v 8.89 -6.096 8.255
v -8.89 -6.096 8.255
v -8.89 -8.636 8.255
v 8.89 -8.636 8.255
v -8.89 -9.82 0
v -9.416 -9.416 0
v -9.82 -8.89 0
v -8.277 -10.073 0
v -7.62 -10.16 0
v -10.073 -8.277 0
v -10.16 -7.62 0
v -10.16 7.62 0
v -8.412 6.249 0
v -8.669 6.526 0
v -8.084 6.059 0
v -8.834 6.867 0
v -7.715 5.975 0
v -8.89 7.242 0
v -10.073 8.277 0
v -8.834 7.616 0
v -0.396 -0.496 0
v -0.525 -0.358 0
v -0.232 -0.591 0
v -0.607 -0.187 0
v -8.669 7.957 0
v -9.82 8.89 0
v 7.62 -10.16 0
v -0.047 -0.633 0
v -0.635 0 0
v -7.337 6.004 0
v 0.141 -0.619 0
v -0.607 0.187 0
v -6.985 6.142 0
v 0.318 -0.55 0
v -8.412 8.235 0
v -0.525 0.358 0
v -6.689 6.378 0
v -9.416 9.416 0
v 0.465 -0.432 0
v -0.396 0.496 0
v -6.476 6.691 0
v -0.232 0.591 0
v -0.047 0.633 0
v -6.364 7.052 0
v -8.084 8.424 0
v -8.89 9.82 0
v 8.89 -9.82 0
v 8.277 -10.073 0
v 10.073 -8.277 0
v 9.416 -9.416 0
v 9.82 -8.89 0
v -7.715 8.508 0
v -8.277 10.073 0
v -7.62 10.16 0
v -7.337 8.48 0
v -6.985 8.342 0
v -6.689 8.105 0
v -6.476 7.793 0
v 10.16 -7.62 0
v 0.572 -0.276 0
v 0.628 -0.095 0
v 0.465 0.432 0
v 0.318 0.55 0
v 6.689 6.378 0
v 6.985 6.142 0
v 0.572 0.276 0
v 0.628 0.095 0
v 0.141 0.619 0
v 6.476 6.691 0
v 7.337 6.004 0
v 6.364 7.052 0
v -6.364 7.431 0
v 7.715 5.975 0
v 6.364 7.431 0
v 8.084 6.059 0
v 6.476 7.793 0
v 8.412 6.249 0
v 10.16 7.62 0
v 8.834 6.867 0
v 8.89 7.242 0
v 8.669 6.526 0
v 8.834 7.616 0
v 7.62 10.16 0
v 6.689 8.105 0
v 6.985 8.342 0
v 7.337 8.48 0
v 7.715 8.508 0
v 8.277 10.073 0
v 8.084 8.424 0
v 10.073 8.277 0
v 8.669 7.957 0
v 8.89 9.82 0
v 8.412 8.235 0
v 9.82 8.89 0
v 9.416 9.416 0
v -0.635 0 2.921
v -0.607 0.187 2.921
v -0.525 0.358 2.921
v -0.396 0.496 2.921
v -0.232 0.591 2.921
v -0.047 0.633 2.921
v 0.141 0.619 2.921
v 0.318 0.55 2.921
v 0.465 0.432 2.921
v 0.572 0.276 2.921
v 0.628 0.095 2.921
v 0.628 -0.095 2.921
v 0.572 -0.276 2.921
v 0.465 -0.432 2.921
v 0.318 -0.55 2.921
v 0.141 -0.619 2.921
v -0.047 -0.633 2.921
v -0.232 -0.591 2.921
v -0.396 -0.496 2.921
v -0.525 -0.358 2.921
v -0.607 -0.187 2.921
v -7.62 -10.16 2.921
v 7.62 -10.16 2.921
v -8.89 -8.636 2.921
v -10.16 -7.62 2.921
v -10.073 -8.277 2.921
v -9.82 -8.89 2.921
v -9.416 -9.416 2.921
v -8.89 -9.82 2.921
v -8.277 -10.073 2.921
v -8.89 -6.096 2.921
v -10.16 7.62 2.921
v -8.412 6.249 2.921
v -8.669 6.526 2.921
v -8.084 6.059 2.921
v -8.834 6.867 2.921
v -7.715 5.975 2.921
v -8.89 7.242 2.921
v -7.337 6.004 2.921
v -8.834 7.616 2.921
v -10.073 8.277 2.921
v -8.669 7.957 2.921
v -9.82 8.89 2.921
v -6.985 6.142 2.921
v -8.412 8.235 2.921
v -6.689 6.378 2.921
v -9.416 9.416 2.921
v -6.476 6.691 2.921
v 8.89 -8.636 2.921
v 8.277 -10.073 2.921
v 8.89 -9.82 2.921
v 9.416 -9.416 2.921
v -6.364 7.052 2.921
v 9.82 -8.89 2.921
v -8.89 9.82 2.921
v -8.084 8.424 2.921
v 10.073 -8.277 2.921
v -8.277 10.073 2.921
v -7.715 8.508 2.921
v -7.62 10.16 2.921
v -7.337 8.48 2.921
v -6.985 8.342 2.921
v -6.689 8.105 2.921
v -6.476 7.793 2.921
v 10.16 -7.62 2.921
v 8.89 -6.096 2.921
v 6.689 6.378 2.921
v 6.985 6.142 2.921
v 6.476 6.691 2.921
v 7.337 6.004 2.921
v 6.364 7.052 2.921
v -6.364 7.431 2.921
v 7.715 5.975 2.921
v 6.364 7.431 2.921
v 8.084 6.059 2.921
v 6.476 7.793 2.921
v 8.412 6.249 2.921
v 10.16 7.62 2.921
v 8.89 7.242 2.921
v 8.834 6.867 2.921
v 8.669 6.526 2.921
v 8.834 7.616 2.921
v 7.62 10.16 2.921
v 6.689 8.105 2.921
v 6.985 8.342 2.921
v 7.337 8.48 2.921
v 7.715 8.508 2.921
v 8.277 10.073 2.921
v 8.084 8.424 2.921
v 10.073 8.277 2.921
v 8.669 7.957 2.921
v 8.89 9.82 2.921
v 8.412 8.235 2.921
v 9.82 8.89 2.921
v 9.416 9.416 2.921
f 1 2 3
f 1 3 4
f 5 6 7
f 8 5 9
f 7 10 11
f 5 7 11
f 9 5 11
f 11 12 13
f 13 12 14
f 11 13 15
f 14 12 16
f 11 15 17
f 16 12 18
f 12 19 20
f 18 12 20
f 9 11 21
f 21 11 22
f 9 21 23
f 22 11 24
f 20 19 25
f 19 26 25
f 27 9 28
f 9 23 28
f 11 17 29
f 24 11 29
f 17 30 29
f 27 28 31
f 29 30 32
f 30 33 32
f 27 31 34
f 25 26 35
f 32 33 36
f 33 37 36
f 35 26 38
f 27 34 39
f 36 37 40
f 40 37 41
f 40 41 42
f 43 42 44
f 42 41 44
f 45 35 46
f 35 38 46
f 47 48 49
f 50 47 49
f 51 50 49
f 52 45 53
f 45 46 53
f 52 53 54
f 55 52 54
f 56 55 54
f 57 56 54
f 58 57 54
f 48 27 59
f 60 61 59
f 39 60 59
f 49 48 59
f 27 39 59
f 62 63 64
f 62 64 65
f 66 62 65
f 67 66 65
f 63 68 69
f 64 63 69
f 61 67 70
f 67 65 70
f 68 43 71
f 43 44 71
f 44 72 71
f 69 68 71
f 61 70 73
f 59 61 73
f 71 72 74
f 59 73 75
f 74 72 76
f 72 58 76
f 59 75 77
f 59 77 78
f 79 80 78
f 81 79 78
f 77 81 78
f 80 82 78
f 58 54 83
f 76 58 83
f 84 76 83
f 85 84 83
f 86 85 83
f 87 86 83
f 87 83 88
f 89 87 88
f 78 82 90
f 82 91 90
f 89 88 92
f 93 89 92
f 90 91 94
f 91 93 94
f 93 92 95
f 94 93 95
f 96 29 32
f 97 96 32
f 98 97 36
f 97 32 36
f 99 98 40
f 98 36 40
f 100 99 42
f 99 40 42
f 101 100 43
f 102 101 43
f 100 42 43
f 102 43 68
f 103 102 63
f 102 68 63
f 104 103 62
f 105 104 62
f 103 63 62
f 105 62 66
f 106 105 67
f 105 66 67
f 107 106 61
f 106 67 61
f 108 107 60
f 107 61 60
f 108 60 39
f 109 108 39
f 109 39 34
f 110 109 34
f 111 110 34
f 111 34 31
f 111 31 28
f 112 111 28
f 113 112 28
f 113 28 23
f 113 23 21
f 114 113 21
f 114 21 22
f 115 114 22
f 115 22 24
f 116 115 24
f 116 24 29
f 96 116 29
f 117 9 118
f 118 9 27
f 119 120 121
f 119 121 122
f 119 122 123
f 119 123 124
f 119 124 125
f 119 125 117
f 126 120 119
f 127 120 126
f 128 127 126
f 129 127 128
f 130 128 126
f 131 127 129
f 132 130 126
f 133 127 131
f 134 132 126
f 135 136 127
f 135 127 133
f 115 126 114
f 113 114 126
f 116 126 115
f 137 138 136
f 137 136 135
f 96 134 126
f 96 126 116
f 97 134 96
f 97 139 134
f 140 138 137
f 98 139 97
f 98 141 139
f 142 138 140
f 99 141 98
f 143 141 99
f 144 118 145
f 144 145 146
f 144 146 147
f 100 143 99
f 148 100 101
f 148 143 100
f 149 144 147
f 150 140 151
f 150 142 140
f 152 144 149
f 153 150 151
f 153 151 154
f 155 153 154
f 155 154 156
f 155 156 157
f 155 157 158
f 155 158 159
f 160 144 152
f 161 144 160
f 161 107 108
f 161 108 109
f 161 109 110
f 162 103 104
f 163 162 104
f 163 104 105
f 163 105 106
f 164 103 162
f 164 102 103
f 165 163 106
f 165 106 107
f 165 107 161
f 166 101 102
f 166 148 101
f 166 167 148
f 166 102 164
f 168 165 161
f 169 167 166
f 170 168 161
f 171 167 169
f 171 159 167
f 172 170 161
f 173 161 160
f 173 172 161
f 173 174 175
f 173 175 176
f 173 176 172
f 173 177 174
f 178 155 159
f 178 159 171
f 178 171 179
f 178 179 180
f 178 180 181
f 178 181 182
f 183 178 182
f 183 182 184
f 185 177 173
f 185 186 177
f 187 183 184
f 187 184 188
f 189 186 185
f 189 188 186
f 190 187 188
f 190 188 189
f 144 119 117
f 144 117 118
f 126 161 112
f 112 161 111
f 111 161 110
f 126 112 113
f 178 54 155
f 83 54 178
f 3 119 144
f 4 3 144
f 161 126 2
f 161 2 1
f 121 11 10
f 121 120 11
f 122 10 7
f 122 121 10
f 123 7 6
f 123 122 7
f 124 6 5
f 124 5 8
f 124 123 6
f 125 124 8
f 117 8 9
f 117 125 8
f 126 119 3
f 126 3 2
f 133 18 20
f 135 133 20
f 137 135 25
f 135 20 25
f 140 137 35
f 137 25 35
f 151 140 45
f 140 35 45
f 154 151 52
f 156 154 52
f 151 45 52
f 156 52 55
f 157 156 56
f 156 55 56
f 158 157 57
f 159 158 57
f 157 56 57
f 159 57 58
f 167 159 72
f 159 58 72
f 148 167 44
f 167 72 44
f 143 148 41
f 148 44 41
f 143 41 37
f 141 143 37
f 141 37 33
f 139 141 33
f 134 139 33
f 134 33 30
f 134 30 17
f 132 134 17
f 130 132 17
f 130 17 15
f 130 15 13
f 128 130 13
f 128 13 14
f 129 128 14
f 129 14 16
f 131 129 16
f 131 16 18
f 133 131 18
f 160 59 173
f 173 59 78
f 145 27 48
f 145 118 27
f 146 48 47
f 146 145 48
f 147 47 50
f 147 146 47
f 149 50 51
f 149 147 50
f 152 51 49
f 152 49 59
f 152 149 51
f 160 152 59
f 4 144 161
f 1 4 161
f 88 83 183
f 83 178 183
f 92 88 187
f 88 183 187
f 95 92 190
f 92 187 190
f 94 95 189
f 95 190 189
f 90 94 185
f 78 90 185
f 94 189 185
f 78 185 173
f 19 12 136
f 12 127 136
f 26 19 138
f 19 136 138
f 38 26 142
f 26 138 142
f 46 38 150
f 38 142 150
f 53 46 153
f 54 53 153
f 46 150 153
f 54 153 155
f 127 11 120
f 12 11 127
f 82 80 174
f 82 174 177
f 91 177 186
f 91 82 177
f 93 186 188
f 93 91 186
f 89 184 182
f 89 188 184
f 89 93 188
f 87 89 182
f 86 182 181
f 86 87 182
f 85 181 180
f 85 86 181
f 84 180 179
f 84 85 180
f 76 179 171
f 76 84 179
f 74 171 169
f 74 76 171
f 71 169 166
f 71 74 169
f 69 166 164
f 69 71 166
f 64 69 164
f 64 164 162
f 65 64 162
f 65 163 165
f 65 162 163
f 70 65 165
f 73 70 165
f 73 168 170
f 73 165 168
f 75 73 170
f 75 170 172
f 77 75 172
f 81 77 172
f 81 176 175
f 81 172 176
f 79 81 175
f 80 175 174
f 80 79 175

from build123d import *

# Parameters (mm, degrees)
F0_W     = 20.32
F0_H     = 20.32
F1_DEPTH = 2.921
F3_D     = 2.54
F5_R     = 2.54
F4_W     = 17.78
F4_H     = 2.54
F6_DEPTH = 5.334
F8_D     = 1.27


# Not quite as in the source:
# - a pattern or mirror of a feature is missing from the dataset's text; its kind, count and spacing are read off the source's solid


with BuildPart() as f1:
    # F0 (on Top) → F1 (new body)
    with BuildSketch(Plane.XY):
        Rectangle(F0_W, F0_H)
    extrude(amount=F1_DEPTH)

    # F3 (through all)
    with Locations(Plane.XY.offset(2.921)):
        with Locations((-7.62, 7.2416714393)):
            f3 = Hole(F3_D / 2)

    # F3_copies: F3 across plane
    add(f3.mirror(Plane(origin=(0, 0, 0), x_dir=(0, 0, 1), z_dir=(1, 0, 0))), mode=Mode.SUBTRACT)

    # F5
    f5_edges = [f1.edges().sort_by_distance(p)[0] for p in [
        (-10.16, 10.16, 1.4605),
        (10.16, 10.16, 1.4605),
        (-10.16, -10.16, 1.4605),
        (10.16, -10.16, 1.4605),
    ]]
    fillet(f5_edges, radius=F5_R)

    # F4 (on face) → F6 (join)
    with BuildSketch(Plane.XY.offset(2.921)):
        with Locations((0, -7.366)):
            Rectangle(F4_W, F4_H)
    extrude(amount=F6_DEPTH)

    # F8 (through all)
    with Locations(Plane.XY.offset(2.921)):
        with Locations((0, 0)):
            Hole(F8_D / 2)


solid = f1.part
